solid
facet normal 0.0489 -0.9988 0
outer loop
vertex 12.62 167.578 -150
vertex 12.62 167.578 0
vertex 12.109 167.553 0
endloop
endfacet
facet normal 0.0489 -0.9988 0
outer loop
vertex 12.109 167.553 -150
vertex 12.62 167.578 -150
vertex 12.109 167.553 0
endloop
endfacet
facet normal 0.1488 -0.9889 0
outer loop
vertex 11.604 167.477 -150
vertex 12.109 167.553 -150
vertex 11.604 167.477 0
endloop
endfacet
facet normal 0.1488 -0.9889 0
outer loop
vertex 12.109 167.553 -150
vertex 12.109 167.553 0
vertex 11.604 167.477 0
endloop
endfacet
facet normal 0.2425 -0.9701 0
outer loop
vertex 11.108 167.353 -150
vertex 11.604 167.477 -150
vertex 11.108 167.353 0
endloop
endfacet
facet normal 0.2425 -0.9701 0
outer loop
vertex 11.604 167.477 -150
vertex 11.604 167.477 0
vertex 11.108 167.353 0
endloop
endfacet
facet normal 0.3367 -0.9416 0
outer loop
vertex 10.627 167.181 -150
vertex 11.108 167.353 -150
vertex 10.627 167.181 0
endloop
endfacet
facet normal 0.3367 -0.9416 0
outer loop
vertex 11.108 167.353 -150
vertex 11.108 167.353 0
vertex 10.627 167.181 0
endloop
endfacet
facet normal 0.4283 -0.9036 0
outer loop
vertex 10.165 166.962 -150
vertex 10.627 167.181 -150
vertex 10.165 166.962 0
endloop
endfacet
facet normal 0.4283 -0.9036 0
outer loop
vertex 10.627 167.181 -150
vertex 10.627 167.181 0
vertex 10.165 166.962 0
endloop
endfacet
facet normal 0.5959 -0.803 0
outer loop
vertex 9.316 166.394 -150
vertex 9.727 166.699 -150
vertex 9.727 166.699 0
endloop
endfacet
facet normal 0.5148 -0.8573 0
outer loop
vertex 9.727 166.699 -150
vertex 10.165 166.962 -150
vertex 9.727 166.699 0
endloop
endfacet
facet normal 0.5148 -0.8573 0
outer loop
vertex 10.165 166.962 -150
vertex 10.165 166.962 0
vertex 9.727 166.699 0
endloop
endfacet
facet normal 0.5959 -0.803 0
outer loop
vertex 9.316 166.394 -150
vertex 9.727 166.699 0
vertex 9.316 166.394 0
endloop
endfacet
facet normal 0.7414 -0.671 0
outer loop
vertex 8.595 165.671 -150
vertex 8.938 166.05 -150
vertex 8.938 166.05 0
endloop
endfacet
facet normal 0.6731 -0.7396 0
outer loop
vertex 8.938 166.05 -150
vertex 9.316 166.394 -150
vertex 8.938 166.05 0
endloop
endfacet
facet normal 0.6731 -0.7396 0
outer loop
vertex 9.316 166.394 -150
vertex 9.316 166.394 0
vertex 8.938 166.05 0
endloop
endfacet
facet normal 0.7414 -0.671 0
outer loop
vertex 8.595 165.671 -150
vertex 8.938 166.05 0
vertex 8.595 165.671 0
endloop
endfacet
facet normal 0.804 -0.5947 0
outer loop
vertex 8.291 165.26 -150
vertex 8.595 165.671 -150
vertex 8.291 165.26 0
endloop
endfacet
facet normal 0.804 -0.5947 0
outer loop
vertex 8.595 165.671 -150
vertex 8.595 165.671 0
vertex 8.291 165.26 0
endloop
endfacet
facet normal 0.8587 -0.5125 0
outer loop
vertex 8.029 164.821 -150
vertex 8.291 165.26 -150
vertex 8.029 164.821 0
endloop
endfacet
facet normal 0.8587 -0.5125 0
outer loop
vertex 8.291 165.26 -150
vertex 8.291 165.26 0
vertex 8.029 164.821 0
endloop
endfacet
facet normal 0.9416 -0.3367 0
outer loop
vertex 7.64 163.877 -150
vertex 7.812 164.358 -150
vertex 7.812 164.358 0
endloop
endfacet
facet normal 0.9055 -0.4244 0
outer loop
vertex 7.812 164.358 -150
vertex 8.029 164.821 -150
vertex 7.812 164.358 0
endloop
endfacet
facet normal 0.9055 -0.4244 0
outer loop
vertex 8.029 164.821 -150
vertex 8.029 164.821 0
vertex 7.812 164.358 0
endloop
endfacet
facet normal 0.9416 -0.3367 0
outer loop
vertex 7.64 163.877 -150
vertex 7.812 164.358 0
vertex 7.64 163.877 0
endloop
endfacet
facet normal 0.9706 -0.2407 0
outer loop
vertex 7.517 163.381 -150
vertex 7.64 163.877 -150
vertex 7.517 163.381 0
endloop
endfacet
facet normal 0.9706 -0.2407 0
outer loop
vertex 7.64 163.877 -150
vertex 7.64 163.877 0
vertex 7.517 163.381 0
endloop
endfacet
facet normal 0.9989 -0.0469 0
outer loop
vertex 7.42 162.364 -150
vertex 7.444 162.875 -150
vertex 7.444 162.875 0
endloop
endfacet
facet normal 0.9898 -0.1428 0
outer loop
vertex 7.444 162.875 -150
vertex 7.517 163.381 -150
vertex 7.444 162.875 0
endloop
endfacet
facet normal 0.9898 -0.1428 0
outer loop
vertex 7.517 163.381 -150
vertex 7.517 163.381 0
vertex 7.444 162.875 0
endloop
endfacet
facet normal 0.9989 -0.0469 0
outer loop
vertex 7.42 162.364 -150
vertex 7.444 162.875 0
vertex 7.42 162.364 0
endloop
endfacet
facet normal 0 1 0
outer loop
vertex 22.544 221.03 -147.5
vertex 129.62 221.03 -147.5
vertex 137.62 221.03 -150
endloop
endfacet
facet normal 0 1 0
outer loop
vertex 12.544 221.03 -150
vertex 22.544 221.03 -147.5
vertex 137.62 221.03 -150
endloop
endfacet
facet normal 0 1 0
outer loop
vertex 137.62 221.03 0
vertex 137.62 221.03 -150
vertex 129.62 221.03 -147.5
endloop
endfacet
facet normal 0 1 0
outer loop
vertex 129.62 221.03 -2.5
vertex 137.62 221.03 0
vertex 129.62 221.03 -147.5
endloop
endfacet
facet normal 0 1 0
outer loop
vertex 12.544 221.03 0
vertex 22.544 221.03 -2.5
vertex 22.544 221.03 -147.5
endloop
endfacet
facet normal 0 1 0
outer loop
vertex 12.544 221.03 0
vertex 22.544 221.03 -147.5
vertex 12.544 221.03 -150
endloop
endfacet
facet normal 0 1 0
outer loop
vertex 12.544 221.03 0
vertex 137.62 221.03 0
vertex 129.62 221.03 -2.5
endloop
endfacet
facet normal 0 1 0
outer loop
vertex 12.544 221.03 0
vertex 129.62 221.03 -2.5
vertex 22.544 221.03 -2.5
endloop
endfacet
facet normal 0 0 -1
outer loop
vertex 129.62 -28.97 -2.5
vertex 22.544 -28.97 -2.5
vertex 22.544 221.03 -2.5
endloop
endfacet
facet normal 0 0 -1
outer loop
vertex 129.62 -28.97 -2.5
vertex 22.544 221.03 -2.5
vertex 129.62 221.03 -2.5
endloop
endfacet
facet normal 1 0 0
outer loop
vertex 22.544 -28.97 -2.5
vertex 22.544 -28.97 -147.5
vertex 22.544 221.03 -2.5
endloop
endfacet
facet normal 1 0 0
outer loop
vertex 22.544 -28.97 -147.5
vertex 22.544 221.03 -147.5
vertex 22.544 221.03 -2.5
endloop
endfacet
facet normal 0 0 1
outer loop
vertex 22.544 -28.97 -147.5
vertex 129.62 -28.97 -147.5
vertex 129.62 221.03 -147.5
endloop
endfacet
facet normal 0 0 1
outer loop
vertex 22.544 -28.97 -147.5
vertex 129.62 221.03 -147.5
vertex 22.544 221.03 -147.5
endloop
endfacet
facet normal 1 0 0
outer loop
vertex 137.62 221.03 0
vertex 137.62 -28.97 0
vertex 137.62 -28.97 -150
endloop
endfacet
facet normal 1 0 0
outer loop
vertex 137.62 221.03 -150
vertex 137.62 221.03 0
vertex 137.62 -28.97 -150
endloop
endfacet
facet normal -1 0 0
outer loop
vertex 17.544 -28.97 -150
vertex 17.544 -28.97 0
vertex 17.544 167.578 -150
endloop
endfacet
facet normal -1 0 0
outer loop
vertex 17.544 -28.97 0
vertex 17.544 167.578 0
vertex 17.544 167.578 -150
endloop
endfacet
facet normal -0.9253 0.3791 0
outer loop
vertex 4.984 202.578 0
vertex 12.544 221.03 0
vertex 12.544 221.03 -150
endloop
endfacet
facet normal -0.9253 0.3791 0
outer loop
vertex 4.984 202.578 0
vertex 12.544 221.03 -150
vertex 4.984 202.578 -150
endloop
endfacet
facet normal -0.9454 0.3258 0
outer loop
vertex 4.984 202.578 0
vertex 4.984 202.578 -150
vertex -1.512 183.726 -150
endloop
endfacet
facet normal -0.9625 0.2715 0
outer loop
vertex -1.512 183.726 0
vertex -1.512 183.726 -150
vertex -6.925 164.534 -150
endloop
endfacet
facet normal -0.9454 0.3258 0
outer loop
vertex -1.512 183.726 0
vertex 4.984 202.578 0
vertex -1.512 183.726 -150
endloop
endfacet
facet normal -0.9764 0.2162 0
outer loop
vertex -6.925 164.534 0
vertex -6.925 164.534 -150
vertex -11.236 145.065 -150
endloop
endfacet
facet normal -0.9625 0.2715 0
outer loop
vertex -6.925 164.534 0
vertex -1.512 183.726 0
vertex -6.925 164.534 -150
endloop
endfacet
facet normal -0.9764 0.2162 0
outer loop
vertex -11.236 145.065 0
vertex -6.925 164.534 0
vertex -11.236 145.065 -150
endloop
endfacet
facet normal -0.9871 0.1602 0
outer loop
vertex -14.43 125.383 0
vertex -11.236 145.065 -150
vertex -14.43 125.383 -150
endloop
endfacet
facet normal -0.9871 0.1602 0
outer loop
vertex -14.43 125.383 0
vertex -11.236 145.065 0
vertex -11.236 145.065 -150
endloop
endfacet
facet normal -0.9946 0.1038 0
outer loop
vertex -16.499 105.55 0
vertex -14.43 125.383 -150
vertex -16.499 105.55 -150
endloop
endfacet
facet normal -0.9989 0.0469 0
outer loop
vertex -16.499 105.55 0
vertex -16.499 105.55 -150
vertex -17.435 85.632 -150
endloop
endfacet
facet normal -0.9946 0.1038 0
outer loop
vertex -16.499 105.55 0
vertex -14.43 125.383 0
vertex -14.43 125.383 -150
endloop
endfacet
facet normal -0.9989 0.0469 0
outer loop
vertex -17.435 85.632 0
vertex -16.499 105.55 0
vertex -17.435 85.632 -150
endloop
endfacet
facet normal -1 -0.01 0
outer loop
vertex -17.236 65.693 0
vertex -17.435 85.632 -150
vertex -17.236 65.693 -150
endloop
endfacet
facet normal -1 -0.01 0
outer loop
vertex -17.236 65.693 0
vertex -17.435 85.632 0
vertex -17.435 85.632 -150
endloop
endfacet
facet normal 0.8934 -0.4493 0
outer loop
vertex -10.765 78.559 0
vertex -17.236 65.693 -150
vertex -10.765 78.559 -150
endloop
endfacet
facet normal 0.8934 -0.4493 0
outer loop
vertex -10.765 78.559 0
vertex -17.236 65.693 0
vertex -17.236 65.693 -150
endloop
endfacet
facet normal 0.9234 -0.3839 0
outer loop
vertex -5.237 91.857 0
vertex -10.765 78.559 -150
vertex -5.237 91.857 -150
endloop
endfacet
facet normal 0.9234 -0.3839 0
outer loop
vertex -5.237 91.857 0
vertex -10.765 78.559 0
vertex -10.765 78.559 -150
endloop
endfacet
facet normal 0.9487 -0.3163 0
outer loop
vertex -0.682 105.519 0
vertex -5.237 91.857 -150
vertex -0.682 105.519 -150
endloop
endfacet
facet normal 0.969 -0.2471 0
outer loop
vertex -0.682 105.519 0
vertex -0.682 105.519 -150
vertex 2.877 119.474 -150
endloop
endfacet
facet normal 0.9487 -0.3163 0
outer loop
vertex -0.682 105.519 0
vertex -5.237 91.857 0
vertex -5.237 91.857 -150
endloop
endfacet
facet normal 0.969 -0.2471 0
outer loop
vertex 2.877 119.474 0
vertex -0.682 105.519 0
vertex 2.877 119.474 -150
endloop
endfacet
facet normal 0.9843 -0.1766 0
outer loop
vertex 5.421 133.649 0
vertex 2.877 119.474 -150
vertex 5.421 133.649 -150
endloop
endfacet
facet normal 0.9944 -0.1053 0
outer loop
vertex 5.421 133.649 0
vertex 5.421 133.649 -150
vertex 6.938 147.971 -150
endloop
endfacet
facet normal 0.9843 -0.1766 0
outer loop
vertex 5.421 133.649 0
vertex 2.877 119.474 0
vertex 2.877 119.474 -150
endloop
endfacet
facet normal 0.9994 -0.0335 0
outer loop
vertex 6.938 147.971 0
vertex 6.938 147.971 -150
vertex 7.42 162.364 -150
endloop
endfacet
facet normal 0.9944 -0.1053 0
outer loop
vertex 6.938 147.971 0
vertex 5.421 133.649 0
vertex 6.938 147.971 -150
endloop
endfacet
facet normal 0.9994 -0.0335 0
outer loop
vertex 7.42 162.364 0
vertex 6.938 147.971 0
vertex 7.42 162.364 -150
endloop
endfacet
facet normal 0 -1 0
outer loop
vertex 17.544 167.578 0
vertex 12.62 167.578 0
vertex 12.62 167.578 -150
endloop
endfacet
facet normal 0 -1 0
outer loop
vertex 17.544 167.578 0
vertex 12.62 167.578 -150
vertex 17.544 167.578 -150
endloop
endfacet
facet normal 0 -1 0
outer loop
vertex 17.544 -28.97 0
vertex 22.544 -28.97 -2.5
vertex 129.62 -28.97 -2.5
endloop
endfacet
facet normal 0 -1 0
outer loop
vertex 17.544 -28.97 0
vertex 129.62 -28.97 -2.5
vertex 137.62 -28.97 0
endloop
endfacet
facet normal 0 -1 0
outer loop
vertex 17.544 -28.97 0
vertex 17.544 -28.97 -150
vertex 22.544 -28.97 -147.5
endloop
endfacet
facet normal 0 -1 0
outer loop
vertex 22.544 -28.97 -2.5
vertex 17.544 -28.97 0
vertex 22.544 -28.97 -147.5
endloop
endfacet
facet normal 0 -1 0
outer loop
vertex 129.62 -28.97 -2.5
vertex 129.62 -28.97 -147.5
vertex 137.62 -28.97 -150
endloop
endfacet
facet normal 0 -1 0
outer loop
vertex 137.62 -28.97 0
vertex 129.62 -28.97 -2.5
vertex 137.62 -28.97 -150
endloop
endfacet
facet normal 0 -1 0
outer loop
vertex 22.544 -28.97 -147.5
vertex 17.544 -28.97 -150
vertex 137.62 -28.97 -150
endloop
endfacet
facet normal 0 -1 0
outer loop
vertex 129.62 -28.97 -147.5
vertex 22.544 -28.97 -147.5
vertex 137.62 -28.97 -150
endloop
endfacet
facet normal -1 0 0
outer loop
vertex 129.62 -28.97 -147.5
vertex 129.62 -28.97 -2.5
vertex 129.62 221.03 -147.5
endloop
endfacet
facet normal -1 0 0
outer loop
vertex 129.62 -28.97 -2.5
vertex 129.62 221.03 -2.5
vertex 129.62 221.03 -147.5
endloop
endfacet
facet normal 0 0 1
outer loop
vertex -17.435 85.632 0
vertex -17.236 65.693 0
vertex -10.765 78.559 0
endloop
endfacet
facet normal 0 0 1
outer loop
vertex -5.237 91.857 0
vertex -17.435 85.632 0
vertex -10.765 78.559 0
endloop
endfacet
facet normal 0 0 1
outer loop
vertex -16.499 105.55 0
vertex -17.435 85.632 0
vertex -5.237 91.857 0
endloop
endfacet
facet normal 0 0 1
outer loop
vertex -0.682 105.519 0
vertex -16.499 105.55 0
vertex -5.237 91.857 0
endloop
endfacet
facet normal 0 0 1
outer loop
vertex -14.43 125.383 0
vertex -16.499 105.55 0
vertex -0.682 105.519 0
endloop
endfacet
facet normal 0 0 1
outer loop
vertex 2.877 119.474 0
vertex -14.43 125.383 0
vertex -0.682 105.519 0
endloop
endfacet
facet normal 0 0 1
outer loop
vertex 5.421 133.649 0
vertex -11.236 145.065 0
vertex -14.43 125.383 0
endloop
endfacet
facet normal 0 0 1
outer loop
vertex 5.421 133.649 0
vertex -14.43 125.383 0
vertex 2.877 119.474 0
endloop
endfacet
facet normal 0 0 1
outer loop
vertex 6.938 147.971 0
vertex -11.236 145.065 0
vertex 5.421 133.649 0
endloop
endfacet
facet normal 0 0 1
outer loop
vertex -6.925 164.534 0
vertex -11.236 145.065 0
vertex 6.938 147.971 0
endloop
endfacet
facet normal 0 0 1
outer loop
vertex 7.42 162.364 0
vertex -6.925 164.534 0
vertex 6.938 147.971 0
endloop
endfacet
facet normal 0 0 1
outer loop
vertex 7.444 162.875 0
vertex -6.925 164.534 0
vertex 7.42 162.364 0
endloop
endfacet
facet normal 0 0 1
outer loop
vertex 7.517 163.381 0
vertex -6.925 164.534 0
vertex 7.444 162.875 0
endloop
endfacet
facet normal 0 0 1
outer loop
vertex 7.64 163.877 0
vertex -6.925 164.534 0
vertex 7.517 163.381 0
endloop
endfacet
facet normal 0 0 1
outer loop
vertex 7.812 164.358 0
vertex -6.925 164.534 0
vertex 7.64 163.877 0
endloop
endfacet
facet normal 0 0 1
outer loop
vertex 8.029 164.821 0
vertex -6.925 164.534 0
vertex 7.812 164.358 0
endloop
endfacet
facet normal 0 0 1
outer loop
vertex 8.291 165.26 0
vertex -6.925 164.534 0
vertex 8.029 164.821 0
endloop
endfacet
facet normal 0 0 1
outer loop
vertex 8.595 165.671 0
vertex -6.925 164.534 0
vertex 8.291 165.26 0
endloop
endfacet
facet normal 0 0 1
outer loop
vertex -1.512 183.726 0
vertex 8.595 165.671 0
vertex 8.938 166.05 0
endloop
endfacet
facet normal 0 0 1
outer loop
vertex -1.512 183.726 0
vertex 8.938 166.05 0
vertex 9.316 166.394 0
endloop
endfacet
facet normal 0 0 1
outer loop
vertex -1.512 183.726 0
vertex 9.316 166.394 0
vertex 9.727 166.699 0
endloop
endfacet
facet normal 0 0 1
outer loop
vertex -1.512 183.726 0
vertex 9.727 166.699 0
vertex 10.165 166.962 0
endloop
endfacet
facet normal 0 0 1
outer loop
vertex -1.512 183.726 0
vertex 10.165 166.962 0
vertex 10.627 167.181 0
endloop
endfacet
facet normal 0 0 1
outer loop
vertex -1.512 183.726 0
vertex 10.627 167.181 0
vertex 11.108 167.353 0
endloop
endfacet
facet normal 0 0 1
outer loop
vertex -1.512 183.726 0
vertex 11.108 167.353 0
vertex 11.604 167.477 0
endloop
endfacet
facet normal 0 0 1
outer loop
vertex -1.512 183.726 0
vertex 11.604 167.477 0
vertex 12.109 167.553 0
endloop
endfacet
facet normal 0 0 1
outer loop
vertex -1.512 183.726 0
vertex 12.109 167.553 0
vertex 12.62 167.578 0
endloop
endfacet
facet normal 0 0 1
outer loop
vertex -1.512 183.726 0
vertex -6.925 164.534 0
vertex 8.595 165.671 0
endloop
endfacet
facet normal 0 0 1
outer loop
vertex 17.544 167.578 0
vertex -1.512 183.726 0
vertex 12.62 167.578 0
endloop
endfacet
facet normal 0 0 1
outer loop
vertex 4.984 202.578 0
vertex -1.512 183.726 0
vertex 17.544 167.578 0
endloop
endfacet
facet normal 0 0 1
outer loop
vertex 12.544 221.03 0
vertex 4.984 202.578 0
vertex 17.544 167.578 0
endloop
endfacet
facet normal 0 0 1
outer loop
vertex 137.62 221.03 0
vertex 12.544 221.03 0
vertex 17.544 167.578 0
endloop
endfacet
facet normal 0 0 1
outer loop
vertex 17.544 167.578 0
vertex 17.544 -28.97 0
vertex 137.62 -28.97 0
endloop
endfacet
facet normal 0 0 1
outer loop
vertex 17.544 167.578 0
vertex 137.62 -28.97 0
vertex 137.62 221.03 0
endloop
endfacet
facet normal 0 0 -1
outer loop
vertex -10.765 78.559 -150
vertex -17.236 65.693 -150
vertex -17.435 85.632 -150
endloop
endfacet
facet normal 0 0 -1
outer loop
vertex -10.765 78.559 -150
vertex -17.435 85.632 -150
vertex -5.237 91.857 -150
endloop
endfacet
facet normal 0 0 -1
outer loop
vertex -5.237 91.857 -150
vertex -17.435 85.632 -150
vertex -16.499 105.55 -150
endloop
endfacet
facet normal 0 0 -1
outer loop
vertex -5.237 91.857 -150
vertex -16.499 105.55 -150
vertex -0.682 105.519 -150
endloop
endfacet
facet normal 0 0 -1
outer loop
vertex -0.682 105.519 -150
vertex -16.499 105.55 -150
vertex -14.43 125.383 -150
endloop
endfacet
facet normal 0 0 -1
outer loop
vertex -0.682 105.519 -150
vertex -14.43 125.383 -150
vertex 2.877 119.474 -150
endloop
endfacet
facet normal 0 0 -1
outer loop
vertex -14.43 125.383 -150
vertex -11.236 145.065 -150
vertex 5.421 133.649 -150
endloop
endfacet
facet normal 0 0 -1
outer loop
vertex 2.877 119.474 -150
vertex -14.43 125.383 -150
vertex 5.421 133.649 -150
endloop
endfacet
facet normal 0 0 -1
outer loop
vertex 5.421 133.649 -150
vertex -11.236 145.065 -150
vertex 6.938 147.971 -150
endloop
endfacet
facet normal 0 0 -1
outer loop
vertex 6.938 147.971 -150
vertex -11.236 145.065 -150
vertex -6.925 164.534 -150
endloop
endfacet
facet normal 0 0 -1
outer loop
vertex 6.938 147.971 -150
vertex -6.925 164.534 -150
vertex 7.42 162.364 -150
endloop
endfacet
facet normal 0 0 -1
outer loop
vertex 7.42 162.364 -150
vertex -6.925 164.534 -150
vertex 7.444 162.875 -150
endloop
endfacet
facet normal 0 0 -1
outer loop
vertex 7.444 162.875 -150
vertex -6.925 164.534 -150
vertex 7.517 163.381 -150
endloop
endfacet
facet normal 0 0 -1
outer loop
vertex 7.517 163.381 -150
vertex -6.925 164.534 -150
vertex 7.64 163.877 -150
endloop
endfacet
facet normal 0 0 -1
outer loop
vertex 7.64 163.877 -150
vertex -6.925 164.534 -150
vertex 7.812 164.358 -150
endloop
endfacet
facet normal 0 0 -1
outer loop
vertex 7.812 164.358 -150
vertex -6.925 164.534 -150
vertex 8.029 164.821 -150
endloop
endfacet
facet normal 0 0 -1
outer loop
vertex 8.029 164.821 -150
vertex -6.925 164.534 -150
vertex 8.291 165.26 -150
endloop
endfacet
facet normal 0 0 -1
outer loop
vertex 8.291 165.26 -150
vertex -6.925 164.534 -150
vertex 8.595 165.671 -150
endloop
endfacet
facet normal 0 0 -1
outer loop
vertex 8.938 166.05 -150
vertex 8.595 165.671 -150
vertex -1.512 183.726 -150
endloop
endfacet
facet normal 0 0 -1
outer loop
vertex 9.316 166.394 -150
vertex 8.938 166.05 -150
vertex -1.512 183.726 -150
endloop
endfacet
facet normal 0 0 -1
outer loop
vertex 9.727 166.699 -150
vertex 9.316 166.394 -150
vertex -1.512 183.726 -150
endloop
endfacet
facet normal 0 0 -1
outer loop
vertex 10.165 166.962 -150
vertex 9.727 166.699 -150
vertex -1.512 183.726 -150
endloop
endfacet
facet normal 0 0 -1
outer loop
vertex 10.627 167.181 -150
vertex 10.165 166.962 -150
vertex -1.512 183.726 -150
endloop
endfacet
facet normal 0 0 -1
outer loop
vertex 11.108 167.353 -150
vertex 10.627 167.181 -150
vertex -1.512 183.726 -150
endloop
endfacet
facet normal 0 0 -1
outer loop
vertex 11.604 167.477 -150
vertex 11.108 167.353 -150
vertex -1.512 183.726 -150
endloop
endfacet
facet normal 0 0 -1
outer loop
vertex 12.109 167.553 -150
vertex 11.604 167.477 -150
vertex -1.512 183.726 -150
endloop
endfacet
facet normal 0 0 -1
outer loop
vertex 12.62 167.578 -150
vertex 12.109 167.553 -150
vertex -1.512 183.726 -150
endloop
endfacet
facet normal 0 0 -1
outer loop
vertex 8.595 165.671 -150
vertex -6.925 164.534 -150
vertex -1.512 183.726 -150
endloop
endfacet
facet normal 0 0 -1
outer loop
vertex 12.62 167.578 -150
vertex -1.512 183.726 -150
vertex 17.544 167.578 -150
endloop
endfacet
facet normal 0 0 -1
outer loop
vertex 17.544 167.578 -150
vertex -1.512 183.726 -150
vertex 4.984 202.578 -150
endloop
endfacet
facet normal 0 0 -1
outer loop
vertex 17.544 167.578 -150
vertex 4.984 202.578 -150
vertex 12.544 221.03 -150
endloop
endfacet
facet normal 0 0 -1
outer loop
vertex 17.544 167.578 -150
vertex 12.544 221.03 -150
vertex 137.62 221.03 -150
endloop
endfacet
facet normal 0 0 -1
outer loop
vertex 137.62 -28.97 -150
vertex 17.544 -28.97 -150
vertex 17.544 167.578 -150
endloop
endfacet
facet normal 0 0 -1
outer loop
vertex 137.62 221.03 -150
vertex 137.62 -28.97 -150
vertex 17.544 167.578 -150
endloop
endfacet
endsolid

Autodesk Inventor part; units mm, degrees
ref_plane "YZ Plane" through (0, 0, 0) normal (1, 0, 0) x (0, 1, 0)
ref_plane "XZ Plane" through (0, 0, 0) normal (0, 1, 0) x (-1, 0, 0)
ref_plane "XY Plane" through (0, 0, 0) normal (0, 0, 1) x (1, 0, 0)
ref_plane "Work Plane1" through (0, 0, 0) normal (0, 0, 1) x (1, 0, 0)
sketch "Sketch1" plane through (0, 0, 0) normal (0, 0, 1) x (1, 0, 0)
  line L0 (17.543857, 167.377737) -> (17.543857, -167.217661)
  line L1 (12.619782, 167.377737) -> (17.543857, 167.377737)
  arc A0 (12.619782, 167.377737) -> (7.619799, 162.364672) centre (12.619782, 162.377737) ccw
  arc A1 (-17.220572, 65.305302) -> (7.619799, 162.364672) centre (-192.379519, 161.842048) ccw
  spline S0 degree 3 poles (15.506608, -167.377737) (14.147951, -162.345779) (13.145398, -158.732995) (12.220923, -155.352167) (11.293739, -151.961434) (10.445107, -148.803984) (9.518675, -145.1939) (8.592185, -141.583591) (7.587911, -137.520736) (6.471828, -132.825116) (5.346807, -128.091892) (4.10798, -122.714929) (2.846807, -117.031098) (1.553707, -111.203383) (0.259478, -105.140337) (-0.92675, -99.276727) (-2.132162, -93.318284) (-3.225902, -87.566367) (-4.23784, -81.945311) (-5.5682, -74.555504) (-6.790359, -67.285613) (-7.971575, -59.836625) (-9.552302, -49.86823) (-11.026112, -39.596979) (-12.264211, -29.351416) (-13.140881, -22.09676) (-13.908596, -14.883997) (-14.596958, -7.852484) (-15.268141, -0.996451) (-15.867695, 5.674384) (-16.352254, 12.543674) (-16.713746, 17.668333) (-17.004603, 22.971721) (-17.201941, 28.510361) (-17.39909, 34.043661) (-17.502934, 39.811858) (-17.52457, 45.347495) (-17.543857, 50.282258) (-17.501315, 54.954248) (-17.410102, 59.083092) (-17.361094, 61.301547) (-17.298032, 63.363057) (-17.220572, 65.305302) knots 0 0 0 0 0.06599902 0.06599902 0.06599902 0.13219142 0.13219142 0.13219142 0.19838797 0.19838797 0.19838797 0.26511464 0.26511464 0.26511464 0.33353047 0.33353047 0.33353047 0.40305279 0.40305279 0.40305279 0.49445138 0.49445138 0.49445138 0.61676292 0.61676292 0.61676292 0.70336901 0.70336901 0.70336901 0.78781372 0.78781372 0.78781372 0.85081155 0.85081155 0.85081155 0.91374865 0.91374865 0.91374865 0.96985415 0.96985415 0.96985415 1 1 1 1
  line L2 (16.076195, -167.223946) -> (15.506608, -167.377737)
  line L3 (17.264865, -167.218855) -> (16.076195, -167.223946)
  line L4 (17.26486, -167.217661) -> (17.264865, -167.218855)
  line L5 (17.543857, -167.217661) -> (17.26486, -167.217661)
  line L6 (-7.380943, 65.327391) -> (-7.294185, 45.068724)
  line L7 (12.904649, 65.39642) -> (-7.380943, 65.327391)
  line L8 (12.973526, 45.15552) -> (12.904649, 65.39642)
  line L9 (-7.294185, 45.068724) -> (12.973526, 45.15552)
  arc A2 (12.543857, 221.029621) -> (-17.220572, 65.305302) centre (332.504822, 79.16708) ccw
  line L10 (12.543857, 221.029621) -> (17.543857, 221.029621)
  line L11 (17.543857, 221.029621) -> (17.543857, 167.377737)
  line L12 (17.543857, 167.377737) -> (12.619782, 167.377737)
  arc A3 (12.619782, 167.577737) -> (7.419799, 162.364149) centre (12.619782, 162.377737) ccw
  line L13 (12.619782, 167.577737) -> (17.743857, 167.577737)
  line L14 (17.743857, 167.577737) -> (17.743857, -167.417661)
  line L15 (17.743857, -167.417661) -> (17.544285, -167.417661)
  line L16 (17.544285, -167.417661) -> (16.103141, -167.423832)
  line L17 (16.103141, -167.423832) -> (15.365657, -167.622957)
  arc A4 (-17.41853, 65.360482) -> (7.419799, 162.364149) centre (-192.379519, 161.842048) ccw
  point P0 (0, 0)
  point P1 (-17.235714, 65.692749)
  point P2 (17.543857, 167.577737)
  dimension "d0" = 5
  dimension "d10" = 350
  dimension "d11" = 0.2
sketch "Sketch1 outline for Extrusion1" plane through (0, 0, 0) normal (0, 0, 1) x (1, 0, 0)
  line L0 (17.543857, 221.029621) -> (12.543857, 221.029621)
  line L1 (17.543857, 167.577737) -> (17.543857, 221.029621)
  line L2 (12.619782, 167.577737) -> (17.543857, 167.577737)
  arc A0 (7.419799, 162.364149) -> (12.619782, 167.577737) centre (12.619782, 162.377737) cw
  arc A1 (-17.235714, 65.692749) -> (7.419799, 162.364149) centre (-192.379519, 161.842048) ccw
  arc A2 (12.543857, 221.029621) -> (-17.235714, 65.692749) centre (332.504822, 79.16708) ccw
extrude "Extrusion1" add sketch "Sketch1 outline for Extrusion1" against normal blind 150
sketch "Sketch2" plane through (12.543857, 221.029621, 0) normal (0, 1, 0) x (1, 0, 0)
  line L0 (0.075924, 0) -> (-4.924076, 0)
  line L1 (0.075924, 0) -> (125.075924, 0)
  line L2 (125.075924, 0) -> (125.075924, 150)
  line L3 (125.075924, 150) -> (0.075924, 150)
  line L4 (0.075924, 150) -> (0.075924, 0)
  line L5 (5, 0) -> (5, 150)
  line L6 (5, 2.5) -> (117.075924, 2.5)
  line L7 (117.075924, 2.5) -> (117.075924, 147.5)
  line L8 (117.075924, 147.5) -> (5, 147.5)
  line L9 (5, 147.5) -> (5, 2.5)
  line L10 (5, 150) -> (10, 150)
  line L11 (10, 150) -> (10, 0)
  line L12 (10, 0) -> (5, 0)
  line L13 (5, 0) -> (5, 150)
  point P0 (-12.543857, 0)
  point P1 (-4.924059, 0)
  point P2 (5, 147.5)
  point P3 (10, 2.5)
  point P4 (10, 147.5)
  dimension "d3" = 125
  dimension "d4" = 2.5
  dimension "d5" = 2.5
  dimension "d6" = 8
  dimension "d9" = 5
extrude "Extrusion2" add sketch "Sketch2" against normal blind 250 contours L5 L6 L11 L1 | L11 L6 L7 L8 L3 L2 L1 | L5 L8 L11 L6 | L3 L11 L8 L5
properties part number "WingBox" material "Plastic, Opaque White"
